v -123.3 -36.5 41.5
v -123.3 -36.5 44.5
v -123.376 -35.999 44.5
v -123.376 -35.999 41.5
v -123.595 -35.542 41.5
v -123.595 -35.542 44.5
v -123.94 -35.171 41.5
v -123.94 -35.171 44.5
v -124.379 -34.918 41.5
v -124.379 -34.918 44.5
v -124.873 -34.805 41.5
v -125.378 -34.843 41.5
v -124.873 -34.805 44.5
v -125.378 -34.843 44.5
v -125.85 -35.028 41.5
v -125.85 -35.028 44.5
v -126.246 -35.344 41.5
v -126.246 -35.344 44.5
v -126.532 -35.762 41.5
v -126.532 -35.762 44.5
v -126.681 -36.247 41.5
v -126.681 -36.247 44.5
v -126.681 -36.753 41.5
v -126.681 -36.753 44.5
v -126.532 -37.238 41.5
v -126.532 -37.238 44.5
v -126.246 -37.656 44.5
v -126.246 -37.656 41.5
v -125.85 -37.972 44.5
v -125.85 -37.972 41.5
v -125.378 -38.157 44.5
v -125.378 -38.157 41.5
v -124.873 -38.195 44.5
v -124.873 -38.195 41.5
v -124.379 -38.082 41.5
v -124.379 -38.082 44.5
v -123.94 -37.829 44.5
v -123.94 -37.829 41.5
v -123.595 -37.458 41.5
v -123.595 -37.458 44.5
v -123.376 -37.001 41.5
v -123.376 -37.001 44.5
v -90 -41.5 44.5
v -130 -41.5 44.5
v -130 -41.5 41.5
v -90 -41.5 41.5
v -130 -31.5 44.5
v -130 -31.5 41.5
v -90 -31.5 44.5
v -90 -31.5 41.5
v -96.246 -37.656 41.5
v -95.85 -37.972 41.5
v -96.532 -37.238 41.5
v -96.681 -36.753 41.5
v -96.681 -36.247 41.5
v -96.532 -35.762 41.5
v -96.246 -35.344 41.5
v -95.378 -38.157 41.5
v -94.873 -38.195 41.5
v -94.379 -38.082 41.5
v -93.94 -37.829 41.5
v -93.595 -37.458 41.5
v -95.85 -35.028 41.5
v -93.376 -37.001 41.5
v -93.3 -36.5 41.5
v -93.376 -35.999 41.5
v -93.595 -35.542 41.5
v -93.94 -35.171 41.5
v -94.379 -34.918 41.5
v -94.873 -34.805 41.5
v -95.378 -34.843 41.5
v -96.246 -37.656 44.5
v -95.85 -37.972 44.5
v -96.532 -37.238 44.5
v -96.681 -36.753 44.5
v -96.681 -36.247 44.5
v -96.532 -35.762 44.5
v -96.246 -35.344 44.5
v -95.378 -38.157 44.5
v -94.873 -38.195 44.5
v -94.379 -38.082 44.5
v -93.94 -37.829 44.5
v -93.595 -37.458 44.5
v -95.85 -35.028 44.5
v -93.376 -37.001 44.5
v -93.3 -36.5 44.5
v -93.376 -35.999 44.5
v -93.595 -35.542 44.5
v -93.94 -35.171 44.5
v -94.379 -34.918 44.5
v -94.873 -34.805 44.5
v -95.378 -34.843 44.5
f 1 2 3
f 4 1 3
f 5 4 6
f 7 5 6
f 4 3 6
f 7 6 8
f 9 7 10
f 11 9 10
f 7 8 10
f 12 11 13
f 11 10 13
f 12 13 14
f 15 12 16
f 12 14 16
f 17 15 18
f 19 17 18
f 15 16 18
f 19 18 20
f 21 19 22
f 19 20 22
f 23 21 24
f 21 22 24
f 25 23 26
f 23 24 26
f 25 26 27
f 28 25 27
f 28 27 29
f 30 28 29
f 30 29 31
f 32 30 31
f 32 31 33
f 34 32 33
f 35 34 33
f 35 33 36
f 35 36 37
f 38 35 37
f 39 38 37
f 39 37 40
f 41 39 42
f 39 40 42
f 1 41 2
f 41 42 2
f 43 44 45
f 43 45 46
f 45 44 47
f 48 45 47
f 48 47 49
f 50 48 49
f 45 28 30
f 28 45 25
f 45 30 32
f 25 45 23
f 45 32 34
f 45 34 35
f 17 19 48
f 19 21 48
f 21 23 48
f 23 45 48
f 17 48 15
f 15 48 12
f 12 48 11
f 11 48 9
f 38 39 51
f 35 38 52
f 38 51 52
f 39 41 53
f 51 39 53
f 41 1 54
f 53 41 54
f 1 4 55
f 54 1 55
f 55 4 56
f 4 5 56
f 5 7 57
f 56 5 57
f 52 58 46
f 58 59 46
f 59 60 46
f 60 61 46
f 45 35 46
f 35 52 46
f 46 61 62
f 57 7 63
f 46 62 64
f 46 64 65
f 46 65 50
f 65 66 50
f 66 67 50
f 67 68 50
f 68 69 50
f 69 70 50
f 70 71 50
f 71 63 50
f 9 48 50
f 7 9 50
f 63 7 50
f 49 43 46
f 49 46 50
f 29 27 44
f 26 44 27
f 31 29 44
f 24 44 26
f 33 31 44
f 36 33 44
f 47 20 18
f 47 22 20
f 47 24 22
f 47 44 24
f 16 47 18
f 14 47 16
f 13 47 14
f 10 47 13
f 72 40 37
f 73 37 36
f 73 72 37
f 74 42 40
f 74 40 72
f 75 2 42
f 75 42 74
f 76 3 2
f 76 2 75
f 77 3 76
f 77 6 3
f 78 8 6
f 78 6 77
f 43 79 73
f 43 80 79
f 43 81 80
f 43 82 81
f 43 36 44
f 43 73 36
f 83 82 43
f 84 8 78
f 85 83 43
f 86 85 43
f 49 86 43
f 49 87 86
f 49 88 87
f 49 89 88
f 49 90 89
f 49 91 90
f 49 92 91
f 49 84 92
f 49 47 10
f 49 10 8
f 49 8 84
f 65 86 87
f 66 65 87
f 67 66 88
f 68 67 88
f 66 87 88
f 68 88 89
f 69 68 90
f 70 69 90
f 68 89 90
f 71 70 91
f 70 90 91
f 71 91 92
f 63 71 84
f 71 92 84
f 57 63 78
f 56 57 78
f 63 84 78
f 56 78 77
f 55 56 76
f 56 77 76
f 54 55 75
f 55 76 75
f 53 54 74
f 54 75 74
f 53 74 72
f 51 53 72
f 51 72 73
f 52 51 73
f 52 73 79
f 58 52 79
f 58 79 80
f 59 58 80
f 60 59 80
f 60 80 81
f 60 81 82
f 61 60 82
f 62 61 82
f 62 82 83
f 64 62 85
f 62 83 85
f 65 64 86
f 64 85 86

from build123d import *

# Parameters (mm, degrees)
MAIN_PROFILE_SKETCH_W = 40
MAIN_PROFILE_SKETCH_H = 10
MAIN_PROFILE_SKETCH_R = 1.7
MAIN_EXTRUSION_DEPTH  = 3


with BuildPart() as part:
    # Main Profile Sketch → Main Extrusion (new body)
    with BuildSketch(Plane.XY.offset(44.5)):
        with Locations((-110, -36.5)):
            Rectangle(MAIN_PROFILE_SKETCH_W, MAIN_PROFILE_SKETCH_H)
        with Locations((-125, -36.5)):
            Circle(MAIN_PROFILE_SKETCH_R, mode=Mode.SUBTRACT)
        with Locations((-95, -36.5)):
            Circle(MAIN_PROFILE_SKETCH_R, mode=Mode.SUBTRACT)
    extrude(amount=-MAIN_EXTRUSION_DEPTH)


solid = part.part
